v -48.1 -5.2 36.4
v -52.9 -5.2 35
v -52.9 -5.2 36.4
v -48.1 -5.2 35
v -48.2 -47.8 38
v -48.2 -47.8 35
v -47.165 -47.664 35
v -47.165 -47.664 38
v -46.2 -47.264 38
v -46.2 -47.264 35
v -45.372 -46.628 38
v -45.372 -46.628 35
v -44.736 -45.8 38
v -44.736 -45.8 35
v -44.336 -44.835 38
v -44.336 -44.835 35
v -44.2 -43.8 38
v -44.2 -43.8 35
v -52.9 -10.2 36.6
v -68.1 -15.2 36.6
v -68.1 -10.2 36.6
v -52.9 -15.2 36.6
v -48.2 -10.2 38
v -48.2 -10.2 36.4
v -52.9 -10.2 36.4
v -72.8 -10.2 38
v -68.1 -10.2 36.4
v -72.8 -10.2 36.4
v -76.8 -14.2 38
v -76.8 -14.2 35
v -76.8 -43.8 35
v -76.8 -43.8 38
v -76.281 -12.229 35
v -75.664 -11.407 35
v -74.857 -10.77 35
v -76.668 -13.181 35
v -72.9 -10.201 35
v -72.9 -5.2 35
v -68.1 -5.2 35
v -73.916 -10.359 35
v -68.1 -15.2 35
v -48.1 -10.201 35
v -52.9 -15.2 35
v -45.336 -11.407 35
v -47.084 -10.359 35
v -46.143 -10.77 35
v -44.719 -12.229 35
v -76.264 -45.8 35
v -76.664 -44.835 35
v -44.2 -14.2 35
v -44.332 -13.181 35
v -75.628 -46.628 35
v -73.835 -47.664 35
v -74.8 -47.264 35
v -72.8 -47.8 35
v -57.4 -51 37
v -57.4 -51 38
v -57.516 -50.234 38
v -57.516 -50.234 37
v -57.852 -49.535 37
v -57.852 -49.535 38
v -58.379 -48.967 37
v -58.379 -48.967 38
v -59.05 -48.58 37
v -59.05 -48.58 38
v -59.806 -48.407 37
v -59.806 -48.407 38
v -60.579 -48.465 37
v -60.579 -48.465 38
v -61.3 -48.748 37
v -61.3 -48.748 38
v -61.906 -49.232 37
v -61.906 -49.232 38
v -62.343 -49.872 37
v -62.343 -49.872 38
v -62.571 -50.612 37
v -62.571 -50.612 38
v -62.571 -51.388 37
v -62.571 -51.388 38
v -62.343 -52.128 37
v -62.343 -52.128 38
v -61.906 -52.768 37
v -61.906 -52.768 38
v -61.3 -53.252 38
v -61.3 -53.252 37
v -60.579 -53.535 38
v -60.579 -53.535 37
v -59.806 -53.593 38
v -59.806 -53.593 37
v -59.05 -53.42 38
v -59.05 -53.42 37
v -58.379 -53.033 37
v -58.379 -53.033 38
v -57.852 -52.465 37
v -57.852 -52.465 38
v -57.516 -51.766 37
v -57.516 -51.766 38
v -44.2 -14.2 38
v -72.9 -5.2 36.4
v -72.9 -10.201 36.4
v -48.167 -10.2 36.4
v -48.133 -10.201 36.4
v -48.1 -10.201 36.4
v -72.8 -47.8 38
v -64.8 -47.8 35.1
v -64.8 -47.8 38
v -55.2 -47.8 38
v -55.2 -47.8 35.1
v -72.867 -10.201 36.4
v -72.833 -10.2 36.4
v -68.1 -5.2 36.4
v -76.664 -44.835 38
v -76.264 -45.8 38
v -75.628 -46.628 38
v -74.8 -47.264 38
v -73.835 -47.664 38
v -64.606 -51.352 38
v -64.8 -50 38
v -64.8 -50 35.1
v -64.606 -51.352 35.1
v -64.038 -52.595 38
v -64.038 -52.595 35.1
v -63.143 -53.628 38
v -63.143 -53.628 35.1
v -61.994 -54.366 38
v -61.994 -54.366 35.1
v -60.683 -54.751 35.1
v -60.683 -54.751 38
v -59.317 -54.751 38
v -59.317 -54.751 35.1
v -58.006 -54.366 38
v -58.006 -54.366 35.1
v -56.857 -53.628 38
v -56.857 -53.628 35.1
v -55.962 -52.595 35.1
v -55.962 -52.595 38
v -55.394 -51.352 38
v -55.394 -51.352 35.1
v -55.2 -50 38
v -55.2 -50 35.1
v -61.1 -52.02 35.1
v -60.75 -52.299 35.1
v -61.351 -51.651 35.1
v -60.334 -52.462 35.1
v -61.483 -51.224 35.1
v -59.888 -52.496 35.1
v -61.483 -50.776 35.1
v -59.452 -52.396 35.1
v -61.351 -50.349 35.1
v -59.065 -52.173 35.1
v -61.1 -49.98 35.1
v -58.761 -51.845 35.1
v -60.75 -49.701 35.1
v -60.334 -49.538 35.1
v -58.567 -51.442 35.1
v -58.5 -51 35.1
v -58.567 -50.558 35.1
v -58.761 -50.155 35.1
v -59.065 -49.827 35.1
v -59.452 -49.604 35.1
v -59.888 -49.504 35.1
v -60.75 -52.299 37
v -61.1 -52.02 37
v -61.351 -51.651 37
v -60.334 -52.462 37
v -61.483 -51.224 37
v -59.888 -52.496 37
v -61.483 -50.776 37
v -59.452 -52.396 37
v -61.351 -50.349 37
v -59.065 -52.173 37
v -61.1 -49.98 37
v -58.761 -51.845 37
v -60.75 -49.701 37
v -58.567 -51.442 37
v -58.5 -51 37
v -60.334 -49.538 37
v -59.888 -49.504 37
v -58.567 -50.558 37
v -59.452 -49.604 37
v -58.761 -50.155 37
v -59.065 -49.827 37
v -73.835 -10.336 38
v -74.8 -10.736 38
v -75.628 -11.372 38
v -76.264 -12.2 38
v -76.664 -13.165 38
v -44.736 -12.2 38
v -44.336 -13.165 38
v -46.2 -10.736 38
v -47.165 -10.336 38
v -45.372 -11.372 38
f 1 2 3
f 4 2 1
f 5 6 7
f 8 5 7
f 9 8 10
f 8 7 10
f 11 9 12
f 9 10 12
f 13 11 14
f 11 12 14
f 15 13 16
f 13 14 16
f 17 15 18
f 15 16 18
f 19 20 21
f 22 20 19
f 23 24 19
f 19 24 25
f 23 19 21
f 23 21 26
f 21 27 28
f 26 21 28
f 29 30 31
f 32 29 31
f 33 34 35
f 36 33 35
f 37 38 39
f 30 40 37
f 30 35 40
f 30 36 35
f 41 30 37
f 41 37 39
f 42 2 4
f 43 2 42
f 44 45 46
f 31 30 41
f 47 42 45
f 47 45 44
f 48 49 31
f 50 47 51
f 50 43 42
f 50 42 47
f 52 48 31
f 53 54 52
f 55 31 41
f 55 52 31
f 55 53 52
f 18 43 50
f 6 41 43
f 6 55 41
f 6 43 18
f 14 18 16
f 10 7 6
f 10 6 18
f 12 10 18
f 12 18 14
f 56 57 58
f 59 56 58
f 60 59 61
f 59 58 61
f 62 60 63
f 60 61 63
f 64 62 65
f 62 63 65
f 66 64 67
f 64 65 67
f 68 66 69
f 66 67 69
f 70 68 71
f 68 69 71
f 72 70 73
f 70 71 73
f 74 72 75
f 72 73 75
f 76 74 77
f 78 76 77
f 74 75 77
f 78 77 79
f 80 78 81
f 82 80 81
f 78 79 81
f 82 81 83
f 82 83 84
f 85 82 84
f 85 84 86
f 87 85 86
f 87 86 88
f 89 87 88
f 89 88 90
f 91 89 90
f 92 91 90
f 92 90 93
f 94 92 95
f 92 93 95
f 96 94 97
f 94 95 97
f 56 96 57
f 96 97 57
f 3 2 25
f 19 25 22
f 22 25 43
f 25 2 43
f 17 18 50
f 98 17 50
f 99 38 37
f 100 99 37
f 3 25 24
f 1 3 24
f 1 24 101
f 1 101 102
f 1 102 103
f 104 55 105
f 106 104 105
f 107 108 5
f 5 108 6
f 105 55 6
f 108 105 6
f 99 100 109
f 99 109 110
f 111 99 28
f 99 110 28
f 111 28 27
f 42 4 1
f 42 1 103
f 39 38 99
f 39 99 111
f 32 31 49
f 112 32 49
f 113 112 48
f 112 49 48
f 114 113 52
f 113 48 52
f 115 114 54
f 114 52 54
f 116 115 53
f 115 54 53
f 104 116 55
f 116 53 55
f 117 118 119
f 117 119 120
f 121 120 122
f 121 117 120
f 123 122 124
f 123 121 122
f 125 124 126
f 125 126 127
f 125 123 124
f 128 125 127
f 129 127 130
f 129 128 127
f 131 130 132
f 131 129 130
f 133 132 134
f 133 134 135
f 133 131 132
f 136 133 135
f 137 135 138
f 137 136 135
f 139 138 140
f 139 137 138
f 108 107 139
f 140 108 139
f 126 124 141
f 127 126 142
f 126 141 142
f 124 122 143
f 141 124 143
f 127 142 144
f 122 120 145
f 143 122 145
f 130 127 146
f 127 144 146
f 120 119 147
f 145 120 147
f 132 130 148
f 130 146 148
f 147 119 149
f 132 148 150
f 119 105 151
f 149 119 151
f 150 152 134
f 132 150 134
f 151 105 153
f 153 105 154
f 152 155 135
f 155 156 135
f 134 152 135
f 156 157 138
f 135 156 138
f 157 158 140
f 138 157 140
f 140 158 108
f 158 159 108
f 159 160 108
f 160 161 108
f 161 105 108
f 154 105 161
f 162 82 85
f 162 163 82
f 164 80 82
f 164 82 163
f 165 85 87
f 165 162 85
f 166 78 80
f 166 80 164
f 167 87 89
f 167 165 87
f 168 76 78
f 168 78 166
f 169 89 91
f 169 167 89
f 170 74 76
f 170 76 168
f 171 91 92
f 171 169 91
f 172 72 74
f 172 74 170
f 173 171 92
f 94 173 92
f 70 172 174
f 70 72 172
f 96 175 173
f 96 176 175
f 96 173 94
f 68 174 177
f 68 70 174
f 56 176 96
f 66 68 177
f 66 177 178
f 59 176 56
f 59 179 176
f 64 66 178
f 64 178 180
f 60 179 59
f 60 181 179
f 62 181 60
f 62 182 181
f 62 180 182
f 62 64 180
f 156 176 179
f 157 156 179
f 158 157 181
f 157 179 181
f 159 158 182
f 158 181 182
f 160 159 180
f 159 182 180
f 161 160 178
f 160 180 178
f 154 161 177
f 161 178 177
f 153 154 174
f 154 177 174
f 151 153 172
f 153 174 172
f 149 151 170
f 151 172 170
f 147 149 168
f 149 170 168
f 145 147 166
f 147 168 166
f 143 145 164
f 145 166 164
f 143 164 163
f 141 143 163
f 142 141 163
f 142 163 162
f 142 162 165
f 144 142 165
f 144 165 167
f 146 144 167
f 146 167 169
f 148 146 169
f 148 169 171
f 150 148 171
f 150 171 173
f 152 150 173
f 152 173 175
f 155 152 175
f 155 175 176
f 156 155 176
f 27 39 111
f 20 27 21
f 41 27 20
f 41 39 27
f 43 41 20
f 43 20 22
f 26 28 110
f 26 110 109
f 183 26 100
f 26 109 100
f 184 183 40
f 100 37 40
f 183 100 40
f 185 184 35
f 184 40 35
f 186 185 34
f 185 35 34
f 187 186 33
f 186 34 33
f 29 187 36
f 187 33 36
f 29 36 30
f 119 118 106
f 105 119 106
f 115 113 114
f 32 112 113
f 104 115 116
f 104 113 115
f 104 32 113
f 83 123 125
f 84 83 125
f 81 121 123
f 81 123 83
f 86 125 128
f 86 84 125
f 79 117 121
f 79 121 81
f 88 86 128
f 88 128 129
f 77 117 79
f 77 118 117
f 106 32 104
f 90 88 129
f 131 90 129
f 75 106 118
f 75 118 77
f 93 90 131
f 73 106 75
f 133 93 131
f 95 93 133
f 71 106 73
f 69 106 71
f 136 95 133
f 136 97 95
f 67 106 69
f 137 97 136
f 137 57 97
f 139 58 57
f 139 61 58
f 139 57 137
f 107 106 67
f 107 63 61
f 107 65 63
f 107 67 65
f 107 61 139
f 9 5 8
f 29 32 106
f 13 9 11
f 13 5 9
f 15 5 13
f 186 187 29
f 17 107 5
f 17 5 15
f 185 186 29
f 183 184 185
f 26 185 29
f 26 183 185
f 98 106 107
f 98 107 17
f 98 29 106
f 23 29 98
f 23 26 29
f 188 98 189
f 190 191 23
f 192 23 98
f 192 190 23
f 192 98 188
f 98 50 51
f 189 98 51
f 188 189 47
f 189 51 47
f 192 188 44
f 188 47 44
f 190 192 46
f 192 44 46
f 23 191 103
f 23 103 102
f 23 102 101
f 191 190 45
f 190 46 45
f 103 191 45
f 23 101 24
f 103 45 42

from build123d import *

# Parameters (mm, degrees)
PAD010_DEPTH    = 3
SKETCH044_W     = 15.2
SKETCH044_H     = 5.2
POCKET033_DEPTH = 1.6
SKETCH045_W     = 4.8
SKETCH045_H     = 6
PAD011_DEPTH    = 1.4
PAD012_DEPTH    = 2.9
SKETCH047_R     = 1.5
POCKET034_DEPTH = 5
SKETCH048_R     = 2.6
POCKET035_DEPTH = 1


with BuildPart() as part:
    # Sketch043 → Pad010 (new body)
    with BuildSketch(Plane.XY):
        with BuildLine():
            Line((-48.2, -10.2), (-72.8, -10.2))
            ThreePointArc((-72.8, -10.2), (-75.628427, -11.371573), (-76.8, -14.2))
            Line((-76.8, -14.2), (-76.8, -43.8))
            ThreePointArc((-76.8, -43.8), (-75.628427, -46.628427), (-72.8, -47.8))
            Line((-72.8, -47.8), (-48.2, -47.8))
            ThreePointArc((-48.2, -47.8), (-45.371573, -46.628427), (-44.2, -43.8))
            Line((-44.2, -43.8), (-44.2, -14.2))
            ThreePointArc((-44.2, -14.2), (-45.371573, -11.371573), (-48.2, -10.2))
        make_face()
    extrude(amount=PAD010_DEPTH)

    # Sketch044 (on Face9 of Pad010) → Pocket033 (cut)
    with BuildSketch(Plane(origin=(0, 0, 0), x_dir=(1, 0, 0), z_dir=(0, 0, -1))):
        with Locations((-60.5, 12.6)):
            Rectangle(SKETCH044_W, SKETCH044_H)
    extrude(amount=-POCKET033_DEPTH, mode=Mode.SUBTRACT)

    # Sketch045 (on Face2 of Pocket033) → Pad011 (join)
    with BuildSketch(Plane(origin=(0, 0, 0), x_dir=(1, 0, 0), z_dir=(0, 0, -1))):
        with Locations((-50.5, 8.2)):
            Rectangle(SKETCH045_W, SKETCH045_H)
        with Locations((-70.5, 8.2)):
            Rectangle(SKETCH045_W, SKETCH045_H)
    extrude(amount=-PAD011_DEPTH)

    # Sketch046 (on Face10 of Pad011) → Pad012 (join)
    with BuildSketch(Plane.XY.offset(3)):
        with BuildLine():
            ThreePointArc((-64.8, -50), (-60, -54.8), (-55.2, -50))
            Line((-55.2, -47.8), (-55.2, -50))
            Line((-64.8, -47.8), (-55.2, -47.8))
            Line((-64.8, -50), (-64.8, -47.8))
        make_face()
    extrude(amount=-PAD012_DEPTH)

    # Sketch047 (on Face24 of Pad012) → Pocket034 (cut)
    with BuildSketch(Plane.XY.offset(3)):
        with Locations((-60, -51)):
            Circle(SKETCH047_R)
    extrude(amount=-POCKET034_DEPTH, mode=Mode.SUBTRACT)

    # Sketch048 (on Face5 of Pocket034) → Pocket035 (cut)
    with BuildSketch(Plane.XY.offset(3)):
        with Locations((-60, -51)):
            Circle(SKETCH048_R)
    extrude(amount=-POCKET035_DEPTH, mode=Mode.SUBTRACT)


with BuildPart() as part_1:
    # Body002 placement: moved
    add(part.part.moved(Location((0, 0, 35))))


solid = part_1.part
